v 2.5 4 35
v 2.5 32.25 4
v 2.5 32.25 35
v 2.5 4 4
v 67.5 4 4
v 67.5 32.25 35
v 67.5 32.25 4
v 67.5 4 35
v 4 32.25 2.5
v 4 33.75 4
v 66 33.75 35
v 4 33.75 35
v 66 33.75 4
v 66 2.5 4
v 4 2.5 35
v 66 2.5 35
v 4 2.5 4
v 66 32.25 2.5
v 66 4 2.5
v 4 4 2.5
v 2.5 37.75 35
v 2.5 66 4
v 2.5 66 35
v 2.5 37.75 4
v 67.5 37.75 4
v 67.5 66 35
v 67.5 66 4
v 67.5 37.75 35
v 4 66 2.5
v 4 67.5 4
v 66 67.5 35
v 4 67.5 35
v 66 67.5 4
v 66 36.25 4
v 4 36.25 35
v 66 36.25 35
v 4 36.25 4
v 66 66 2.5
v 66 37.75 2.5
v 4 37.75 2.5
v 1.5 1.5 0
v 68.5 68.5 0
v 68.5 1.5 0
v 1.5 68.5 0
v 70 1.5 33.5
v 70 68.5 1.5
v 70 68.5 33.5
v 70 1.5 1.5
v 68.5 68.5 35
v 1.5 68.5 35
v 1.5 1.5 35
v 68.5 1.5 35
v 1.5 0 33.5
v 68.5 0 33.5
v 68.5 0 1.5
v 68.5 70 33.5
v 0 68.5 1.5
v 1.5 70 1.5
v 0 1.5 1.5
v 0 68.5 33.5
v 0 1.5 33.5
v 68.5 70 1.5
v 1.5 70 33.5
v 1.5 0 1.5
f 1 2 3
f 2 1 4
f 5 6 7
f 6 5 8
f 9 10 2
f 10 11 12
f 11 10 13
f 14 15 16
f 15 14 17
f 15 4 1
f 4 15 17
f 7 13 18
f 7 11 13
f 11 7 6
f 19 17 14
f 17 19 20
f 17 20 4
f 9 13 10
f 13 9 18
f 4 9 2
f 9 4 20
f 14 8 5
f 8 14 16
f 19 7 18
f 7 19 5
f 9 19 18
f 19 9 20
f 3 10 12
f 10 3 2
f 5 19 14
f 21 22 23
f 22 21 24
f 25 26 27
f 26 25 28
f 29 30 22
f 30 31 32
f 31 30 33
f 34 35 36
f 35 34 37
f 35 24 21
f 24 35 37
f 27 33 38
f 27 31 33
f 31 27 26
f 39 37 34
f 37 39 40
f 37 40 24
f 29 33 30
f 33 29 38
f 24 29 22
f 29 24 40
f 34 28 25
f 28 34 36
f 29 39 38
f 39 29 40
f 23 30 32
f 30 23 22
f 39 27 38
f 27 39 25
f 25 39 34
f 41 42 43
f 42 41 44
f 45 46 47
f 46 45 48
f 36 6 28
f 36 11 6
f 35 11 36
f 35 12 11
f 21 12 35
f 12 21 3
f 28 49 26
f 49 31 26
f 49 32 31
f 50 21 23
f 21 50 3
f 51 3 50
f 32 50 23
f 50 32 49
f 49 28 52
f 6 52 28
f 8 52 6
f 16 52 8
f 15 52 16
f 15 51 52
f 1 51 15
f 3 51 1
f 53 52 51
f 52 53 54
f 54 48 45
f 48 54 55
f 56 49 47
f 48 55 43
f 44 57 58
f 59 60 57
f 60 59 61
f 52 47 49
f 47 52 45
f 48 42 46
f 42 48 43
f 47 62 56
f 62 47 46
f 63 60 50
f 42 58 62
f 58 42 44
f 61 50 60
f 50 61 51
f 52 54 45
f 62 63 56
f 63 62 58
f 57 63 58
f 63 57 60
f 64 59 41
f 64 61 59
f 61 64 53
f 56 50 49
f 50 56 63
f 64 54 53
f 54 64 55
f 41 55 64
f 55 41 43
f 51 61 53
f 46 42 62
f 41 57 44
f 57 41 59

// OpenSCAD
// Written by WolfOne
// License - CC BY 4.0
// https://github.com/Wolf-0ne/3d-modeling-projects

$fn = 90;

/* Dimensions */

width = 70;
height = 35;
wallthickness = 2.5;
divisions = 2;

/* Dimensions */

chamfer = wallthickness/5*3; // 2/sqrt(2);
dividerMultiplier = chamfer; // wallthickness/5*3 or 1.5
    
/**/

module chamferedCube(xyz, chamfer){
  c2 = chamfer * 2;
  a = [xyz[0] - c2, xyz[1] - c2, xyz[2]];
  b = [xyz[0] - c2, xyz[1], xyz[2] - c2];
  c = [xyz[0], xyz[1] - c2, xyz[2] - c2];
  hull(){
    translate([chamfer,chamfer,0])
      cube(a);
    translate([chamfer,0,chamfer])
      cube(b);
    translate([0,chamfer,chamfer])
      cube(c);
    }
  }
	
module dividers(d) {

  t = wallthickness;
	t1 = t*1.5;
	t2 = t/2;
	w = width;
	w2 = width/2;
	w3 = width/3;
	c = chamfer;
	m = dividerMultiplier;
	
  if (d == 1){
		translate([t,t,t])
      chamferedCube([w-t*2,w-t*2,height], c);
    }
  else if (d == 2){
		translate([t,t,t])
      chamferedCube([w-t*2,w2-t*m,height], c);
		translate([t,w/2+t/2,t])
      chamferedCube([w-t*2,w2-t*m,height], c);
    }
  else if (d == 3){
		translate([t,t,t])
      chamferedCube([w-t*2,w3-t*m,height], c);
		translate([t,w3+t/3*2,t])
      chamferedCube([w-t*2,w3-t*m,height], c);
		translate([t,w3*2+t/3,t])
      chamferedCube([w-t*2,w3-t*m,height], c);
    }
  else if (d == 4){
		translate([t,t,t])
      chamferedCube([w2-t*m,w2-t*m,height], c);
		translate([t,w/2+t/2,t])
      chamferedCube([w2-t*m,w2-t*m,height], c);
		translate([w/2+t/2,t,t])
      chamferedCube([w2-t*m,w2-t*m,height], c);
		translate([w/2+t/2,w/2+t/2,t])
      chamferedCube([w2-t*m,w2-t*m,height], c);
    } 
		
  }

/**/

difference(){
  union(){
    chamferedCube([width,width,height], chamfer);
    }
  union(){
		dividers(divisions);
    }
  }
  
/**/
